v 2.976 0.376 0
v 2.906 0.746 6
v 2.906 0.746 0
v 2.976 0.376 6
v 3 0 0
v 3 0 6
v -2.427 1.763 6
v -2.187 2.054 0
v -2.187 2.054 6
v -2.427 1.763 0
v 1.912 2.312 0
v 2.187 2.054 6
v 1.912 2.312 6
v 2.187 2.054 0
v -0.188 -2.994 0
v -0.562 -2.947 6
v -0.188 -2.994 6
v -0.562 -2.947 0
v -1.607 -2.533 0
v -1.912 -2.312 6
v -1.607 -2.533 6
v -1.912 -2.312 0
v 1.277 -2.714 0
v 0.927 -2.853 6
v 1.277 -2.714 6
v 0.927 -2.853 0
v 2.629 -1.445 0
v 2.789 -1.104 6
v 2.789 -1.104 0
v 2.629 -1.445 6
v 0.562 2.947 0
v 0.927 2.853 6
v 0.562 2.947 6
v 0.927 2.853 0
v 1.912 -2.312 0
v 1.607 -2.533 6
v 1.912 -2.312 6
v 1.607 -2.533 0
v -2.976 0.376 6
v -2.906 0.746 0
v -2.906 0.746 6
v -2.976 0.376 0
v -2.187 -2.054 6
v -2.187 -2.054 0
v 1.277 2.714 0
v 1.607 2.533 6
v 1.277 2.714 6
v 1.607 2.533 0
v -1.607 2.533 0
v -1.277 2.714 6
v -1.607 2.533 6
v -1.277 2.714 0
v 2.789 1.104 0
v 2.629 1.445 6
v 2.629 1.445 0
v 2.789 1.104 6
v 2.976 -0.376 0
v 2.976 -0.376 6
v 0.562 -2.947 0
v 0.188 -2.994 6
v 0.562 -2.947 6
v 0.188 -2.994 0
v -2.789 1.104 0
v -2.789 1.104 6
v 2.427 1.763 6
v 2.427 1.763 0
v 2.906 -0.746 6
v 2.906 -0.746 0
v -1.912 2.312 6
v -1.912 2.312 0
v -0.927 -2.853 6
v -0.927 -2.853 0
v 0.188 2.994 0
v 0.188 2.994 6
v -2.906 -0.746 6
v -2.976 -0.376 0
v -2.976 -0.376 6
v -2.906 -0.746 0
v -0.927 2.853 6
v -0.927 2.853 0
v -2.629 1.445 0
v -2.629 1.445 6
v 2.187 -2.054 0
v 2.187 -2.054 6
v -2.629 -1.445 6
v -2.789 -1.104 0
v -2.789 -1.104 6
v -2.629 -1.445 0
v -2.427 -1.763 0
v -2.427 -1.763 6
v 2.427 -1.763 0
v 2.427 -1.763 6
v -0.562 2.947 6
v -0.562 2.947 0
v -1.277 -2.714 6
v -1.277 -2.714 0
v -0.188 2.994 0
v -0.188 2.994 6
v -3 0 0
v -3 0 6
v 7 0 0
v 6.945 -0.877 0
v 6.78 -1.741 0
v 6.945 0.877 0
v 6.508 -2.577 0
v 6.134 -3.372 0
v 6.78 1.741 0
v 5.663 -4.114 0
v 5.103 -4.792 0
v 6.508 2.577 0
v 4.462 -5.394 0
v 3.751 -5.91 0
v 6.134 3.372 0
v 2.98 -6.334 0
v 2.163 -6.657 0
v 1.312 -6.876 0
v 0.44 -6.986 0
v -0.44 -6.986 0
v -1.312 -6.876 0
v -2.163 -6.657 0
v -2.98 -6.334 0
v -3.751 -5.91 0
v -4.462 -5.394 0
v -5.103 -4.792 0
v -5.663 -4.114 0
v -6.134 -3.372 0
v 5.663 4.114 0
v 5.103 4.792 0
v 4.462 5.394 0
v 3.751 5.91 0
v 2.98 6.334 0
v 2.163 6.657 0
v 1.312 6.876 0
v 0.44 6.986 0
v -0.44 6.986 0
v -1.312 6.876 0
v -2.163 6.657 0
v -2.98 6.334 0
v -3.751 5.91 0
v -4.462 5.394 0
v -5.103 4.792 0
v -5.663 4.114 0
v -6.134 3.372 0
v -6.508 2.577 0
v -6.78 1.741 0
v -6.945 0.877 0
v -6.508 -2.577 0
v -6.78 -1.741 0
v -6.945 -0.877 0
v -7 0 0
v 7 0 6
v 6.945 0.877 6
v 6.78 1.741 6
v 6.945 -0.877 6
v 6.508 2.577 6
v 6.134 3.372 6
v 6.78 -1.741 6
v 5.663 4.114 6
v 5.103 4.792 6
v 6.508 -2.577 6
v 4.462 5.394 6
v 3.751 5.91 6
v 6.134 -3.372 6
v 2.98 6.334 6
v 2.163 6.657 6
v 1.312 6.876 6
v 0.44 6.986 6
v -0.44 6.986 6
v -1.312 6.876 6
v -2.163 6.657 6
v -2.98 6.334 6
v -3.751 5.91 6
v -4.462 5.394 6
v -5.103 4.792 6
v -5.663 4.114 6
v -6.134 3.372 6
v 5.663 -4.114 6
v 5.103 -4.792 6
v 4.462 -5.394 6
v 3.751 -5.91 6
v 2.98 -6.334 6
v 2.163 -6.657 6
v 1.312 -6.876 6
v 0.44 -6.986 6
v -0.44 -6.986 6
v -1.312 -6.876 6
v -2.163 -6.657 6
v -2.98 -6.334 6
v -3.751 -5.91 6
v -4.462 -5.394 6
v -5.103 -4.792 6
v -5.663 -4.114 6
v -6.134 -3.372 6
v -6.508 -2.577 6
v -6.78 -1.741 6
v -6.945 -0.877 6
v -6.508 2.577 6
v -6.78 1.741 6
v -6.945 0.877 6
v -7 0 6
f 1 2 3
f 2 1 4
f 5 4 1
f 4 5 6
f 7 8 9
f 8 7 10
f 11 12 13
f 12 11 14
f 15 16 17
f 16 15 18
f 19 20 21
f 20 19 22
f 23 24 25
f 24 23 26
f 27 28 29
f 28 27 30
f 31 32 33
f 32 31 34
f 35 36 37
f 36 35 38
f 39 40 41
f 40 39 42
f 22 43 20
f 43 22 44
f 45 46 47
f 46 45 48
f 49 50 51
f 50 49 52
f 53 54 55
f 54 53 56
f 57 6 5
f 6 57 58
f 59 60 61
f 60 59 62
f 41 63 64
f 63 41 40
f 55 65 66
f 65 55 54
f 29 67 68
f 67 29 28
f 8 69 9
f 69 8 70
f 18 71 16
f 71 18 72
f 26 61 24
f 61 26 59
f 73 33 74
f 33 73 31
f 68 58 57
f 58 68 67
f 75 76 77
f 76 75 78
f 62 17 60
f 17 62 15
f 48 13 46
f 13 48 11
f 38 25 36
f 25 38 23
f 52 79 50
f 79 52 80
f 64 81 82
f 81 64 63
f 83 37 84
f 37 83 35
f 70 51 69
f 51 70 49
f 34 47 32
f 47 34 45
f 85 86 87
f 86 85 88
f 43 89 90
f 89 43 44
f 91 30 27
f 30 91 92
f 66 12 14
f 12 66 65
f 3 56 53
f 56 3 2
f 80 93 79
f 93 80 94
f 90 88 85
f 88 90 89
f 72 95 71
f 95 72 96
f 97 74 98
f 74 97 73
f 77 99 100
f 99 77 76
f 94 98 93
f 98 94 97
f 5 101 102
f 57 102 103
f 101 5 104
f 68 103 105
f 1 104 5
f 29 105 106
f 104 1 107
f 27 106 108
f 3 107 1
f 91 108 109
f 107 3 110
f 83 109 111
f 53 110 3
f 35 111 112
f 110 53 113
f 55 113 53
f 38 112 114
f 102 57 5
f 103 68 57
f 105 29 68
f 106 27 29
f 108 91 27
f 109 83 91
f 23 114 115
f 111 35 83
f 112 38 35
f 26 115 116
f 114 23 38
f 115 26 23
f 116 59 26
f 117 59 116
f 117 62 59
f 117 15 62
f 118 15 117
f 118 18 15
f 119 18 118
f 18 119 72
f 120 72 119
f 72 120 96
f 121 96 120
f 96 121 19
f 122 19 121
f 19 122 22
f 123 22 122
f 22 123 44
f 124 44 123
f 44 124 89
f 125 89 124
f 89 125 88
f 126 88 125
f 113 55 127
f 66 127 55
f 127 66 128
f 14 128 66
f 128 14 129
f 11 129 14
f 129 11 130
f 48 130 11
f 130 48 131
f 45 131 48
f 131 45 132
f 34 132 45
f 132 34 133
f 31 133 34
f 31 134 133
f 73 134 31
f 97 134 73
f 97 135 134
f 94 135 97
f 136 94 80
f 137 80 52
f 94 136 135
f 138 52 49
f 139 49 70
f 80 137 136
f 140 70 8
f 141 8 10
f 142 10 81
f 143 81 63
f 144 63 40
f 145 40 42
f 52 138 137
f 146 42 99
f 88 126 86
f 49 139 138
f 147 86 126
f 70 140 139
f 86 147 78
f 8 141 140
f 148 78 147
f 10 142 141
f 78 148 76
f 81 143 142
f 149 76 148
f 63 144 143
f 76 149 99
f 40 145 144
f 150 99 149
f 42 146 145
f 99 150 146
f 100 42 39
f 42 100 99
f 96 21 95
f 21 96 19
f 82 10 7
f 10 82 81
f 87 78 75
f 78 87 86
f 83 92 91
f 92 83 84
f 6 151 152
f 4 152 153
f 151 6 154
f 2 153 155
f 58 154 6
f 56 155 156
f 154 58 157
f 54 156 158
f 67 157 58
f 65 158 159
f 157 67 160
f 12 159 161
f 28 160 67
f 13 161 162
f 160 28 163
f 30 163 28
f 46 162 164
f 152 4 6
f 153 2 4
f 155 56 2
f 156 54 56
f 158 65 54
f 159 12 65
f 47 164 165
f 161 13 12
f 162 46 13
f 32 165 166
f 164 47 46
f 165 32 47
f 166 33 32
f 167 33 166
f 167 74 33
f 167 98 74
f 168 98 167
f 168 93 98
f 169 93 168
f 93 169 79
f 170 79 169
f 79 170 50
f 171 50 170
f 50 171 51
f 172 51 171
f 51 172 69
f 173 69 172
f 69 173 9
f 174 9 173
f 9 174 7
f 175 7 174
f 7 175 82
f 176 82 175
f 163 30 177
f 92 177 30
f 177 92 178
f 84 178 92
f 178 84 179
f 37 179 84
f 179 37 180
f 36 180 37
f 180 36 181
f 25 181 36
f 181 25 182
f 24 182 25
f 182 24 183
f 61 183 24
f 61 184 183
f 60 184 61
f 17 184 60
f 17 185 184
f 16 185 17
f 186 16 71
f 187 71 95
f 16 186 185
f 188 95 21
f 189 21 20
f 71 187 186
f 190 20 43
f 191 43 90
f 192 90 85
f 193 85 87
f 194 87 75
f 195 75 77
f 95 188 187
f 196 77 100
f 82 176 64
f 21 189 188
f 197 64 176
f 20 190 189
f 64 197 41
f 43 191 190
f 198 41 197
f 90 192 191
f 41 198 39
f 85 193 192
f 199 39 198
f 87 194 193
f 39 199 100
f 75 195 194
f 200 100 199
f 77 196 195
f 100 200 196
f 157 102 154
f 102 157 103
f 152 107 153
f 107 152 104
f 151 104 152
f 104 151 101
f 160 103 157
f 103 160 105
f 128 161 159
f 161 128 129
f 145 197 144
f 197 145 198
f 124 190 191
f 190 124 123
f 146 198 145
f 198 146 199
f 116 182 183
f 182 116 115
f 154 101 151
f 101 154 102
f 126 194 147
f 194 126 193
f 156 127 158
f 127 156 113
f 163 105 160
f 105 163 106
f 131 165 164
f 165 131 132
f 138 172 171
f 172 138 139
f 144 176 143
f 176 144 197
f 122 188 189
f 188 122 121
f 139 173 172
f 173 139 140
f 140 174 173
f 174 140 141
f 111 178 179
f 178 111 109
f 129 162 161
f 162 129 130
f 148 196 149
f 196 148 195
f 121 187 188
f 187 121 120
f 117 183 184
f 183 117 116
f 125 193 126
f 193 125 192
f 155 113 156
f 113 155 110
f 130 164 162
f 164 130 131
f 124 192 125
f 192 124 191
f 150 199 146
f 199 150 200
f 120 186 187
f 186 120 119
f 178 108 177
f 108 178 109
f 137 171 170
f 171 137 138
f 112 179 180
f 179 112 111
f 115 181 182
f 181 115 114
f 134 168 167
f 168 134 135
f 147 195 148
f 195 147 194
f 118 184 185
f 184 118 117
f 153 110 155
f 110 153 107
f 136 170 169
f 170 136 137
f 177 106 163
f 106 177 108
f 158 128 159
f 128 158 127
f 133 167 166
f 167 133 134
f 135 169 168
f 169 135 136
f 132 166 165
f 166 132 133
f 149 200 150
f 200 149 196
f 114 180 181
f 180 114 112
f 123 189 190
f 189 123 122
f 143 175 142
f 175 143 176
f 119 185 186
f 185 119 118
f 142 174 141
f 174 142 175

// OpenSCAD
$fn = 50;

difference() {
	union() {
		cylinder(h = 6, r = 7.0);
	}
	union() {
		cylinder(h = 6, r = 3.0);
		cylinder(h = 6, r = 1.5);
	}
}
